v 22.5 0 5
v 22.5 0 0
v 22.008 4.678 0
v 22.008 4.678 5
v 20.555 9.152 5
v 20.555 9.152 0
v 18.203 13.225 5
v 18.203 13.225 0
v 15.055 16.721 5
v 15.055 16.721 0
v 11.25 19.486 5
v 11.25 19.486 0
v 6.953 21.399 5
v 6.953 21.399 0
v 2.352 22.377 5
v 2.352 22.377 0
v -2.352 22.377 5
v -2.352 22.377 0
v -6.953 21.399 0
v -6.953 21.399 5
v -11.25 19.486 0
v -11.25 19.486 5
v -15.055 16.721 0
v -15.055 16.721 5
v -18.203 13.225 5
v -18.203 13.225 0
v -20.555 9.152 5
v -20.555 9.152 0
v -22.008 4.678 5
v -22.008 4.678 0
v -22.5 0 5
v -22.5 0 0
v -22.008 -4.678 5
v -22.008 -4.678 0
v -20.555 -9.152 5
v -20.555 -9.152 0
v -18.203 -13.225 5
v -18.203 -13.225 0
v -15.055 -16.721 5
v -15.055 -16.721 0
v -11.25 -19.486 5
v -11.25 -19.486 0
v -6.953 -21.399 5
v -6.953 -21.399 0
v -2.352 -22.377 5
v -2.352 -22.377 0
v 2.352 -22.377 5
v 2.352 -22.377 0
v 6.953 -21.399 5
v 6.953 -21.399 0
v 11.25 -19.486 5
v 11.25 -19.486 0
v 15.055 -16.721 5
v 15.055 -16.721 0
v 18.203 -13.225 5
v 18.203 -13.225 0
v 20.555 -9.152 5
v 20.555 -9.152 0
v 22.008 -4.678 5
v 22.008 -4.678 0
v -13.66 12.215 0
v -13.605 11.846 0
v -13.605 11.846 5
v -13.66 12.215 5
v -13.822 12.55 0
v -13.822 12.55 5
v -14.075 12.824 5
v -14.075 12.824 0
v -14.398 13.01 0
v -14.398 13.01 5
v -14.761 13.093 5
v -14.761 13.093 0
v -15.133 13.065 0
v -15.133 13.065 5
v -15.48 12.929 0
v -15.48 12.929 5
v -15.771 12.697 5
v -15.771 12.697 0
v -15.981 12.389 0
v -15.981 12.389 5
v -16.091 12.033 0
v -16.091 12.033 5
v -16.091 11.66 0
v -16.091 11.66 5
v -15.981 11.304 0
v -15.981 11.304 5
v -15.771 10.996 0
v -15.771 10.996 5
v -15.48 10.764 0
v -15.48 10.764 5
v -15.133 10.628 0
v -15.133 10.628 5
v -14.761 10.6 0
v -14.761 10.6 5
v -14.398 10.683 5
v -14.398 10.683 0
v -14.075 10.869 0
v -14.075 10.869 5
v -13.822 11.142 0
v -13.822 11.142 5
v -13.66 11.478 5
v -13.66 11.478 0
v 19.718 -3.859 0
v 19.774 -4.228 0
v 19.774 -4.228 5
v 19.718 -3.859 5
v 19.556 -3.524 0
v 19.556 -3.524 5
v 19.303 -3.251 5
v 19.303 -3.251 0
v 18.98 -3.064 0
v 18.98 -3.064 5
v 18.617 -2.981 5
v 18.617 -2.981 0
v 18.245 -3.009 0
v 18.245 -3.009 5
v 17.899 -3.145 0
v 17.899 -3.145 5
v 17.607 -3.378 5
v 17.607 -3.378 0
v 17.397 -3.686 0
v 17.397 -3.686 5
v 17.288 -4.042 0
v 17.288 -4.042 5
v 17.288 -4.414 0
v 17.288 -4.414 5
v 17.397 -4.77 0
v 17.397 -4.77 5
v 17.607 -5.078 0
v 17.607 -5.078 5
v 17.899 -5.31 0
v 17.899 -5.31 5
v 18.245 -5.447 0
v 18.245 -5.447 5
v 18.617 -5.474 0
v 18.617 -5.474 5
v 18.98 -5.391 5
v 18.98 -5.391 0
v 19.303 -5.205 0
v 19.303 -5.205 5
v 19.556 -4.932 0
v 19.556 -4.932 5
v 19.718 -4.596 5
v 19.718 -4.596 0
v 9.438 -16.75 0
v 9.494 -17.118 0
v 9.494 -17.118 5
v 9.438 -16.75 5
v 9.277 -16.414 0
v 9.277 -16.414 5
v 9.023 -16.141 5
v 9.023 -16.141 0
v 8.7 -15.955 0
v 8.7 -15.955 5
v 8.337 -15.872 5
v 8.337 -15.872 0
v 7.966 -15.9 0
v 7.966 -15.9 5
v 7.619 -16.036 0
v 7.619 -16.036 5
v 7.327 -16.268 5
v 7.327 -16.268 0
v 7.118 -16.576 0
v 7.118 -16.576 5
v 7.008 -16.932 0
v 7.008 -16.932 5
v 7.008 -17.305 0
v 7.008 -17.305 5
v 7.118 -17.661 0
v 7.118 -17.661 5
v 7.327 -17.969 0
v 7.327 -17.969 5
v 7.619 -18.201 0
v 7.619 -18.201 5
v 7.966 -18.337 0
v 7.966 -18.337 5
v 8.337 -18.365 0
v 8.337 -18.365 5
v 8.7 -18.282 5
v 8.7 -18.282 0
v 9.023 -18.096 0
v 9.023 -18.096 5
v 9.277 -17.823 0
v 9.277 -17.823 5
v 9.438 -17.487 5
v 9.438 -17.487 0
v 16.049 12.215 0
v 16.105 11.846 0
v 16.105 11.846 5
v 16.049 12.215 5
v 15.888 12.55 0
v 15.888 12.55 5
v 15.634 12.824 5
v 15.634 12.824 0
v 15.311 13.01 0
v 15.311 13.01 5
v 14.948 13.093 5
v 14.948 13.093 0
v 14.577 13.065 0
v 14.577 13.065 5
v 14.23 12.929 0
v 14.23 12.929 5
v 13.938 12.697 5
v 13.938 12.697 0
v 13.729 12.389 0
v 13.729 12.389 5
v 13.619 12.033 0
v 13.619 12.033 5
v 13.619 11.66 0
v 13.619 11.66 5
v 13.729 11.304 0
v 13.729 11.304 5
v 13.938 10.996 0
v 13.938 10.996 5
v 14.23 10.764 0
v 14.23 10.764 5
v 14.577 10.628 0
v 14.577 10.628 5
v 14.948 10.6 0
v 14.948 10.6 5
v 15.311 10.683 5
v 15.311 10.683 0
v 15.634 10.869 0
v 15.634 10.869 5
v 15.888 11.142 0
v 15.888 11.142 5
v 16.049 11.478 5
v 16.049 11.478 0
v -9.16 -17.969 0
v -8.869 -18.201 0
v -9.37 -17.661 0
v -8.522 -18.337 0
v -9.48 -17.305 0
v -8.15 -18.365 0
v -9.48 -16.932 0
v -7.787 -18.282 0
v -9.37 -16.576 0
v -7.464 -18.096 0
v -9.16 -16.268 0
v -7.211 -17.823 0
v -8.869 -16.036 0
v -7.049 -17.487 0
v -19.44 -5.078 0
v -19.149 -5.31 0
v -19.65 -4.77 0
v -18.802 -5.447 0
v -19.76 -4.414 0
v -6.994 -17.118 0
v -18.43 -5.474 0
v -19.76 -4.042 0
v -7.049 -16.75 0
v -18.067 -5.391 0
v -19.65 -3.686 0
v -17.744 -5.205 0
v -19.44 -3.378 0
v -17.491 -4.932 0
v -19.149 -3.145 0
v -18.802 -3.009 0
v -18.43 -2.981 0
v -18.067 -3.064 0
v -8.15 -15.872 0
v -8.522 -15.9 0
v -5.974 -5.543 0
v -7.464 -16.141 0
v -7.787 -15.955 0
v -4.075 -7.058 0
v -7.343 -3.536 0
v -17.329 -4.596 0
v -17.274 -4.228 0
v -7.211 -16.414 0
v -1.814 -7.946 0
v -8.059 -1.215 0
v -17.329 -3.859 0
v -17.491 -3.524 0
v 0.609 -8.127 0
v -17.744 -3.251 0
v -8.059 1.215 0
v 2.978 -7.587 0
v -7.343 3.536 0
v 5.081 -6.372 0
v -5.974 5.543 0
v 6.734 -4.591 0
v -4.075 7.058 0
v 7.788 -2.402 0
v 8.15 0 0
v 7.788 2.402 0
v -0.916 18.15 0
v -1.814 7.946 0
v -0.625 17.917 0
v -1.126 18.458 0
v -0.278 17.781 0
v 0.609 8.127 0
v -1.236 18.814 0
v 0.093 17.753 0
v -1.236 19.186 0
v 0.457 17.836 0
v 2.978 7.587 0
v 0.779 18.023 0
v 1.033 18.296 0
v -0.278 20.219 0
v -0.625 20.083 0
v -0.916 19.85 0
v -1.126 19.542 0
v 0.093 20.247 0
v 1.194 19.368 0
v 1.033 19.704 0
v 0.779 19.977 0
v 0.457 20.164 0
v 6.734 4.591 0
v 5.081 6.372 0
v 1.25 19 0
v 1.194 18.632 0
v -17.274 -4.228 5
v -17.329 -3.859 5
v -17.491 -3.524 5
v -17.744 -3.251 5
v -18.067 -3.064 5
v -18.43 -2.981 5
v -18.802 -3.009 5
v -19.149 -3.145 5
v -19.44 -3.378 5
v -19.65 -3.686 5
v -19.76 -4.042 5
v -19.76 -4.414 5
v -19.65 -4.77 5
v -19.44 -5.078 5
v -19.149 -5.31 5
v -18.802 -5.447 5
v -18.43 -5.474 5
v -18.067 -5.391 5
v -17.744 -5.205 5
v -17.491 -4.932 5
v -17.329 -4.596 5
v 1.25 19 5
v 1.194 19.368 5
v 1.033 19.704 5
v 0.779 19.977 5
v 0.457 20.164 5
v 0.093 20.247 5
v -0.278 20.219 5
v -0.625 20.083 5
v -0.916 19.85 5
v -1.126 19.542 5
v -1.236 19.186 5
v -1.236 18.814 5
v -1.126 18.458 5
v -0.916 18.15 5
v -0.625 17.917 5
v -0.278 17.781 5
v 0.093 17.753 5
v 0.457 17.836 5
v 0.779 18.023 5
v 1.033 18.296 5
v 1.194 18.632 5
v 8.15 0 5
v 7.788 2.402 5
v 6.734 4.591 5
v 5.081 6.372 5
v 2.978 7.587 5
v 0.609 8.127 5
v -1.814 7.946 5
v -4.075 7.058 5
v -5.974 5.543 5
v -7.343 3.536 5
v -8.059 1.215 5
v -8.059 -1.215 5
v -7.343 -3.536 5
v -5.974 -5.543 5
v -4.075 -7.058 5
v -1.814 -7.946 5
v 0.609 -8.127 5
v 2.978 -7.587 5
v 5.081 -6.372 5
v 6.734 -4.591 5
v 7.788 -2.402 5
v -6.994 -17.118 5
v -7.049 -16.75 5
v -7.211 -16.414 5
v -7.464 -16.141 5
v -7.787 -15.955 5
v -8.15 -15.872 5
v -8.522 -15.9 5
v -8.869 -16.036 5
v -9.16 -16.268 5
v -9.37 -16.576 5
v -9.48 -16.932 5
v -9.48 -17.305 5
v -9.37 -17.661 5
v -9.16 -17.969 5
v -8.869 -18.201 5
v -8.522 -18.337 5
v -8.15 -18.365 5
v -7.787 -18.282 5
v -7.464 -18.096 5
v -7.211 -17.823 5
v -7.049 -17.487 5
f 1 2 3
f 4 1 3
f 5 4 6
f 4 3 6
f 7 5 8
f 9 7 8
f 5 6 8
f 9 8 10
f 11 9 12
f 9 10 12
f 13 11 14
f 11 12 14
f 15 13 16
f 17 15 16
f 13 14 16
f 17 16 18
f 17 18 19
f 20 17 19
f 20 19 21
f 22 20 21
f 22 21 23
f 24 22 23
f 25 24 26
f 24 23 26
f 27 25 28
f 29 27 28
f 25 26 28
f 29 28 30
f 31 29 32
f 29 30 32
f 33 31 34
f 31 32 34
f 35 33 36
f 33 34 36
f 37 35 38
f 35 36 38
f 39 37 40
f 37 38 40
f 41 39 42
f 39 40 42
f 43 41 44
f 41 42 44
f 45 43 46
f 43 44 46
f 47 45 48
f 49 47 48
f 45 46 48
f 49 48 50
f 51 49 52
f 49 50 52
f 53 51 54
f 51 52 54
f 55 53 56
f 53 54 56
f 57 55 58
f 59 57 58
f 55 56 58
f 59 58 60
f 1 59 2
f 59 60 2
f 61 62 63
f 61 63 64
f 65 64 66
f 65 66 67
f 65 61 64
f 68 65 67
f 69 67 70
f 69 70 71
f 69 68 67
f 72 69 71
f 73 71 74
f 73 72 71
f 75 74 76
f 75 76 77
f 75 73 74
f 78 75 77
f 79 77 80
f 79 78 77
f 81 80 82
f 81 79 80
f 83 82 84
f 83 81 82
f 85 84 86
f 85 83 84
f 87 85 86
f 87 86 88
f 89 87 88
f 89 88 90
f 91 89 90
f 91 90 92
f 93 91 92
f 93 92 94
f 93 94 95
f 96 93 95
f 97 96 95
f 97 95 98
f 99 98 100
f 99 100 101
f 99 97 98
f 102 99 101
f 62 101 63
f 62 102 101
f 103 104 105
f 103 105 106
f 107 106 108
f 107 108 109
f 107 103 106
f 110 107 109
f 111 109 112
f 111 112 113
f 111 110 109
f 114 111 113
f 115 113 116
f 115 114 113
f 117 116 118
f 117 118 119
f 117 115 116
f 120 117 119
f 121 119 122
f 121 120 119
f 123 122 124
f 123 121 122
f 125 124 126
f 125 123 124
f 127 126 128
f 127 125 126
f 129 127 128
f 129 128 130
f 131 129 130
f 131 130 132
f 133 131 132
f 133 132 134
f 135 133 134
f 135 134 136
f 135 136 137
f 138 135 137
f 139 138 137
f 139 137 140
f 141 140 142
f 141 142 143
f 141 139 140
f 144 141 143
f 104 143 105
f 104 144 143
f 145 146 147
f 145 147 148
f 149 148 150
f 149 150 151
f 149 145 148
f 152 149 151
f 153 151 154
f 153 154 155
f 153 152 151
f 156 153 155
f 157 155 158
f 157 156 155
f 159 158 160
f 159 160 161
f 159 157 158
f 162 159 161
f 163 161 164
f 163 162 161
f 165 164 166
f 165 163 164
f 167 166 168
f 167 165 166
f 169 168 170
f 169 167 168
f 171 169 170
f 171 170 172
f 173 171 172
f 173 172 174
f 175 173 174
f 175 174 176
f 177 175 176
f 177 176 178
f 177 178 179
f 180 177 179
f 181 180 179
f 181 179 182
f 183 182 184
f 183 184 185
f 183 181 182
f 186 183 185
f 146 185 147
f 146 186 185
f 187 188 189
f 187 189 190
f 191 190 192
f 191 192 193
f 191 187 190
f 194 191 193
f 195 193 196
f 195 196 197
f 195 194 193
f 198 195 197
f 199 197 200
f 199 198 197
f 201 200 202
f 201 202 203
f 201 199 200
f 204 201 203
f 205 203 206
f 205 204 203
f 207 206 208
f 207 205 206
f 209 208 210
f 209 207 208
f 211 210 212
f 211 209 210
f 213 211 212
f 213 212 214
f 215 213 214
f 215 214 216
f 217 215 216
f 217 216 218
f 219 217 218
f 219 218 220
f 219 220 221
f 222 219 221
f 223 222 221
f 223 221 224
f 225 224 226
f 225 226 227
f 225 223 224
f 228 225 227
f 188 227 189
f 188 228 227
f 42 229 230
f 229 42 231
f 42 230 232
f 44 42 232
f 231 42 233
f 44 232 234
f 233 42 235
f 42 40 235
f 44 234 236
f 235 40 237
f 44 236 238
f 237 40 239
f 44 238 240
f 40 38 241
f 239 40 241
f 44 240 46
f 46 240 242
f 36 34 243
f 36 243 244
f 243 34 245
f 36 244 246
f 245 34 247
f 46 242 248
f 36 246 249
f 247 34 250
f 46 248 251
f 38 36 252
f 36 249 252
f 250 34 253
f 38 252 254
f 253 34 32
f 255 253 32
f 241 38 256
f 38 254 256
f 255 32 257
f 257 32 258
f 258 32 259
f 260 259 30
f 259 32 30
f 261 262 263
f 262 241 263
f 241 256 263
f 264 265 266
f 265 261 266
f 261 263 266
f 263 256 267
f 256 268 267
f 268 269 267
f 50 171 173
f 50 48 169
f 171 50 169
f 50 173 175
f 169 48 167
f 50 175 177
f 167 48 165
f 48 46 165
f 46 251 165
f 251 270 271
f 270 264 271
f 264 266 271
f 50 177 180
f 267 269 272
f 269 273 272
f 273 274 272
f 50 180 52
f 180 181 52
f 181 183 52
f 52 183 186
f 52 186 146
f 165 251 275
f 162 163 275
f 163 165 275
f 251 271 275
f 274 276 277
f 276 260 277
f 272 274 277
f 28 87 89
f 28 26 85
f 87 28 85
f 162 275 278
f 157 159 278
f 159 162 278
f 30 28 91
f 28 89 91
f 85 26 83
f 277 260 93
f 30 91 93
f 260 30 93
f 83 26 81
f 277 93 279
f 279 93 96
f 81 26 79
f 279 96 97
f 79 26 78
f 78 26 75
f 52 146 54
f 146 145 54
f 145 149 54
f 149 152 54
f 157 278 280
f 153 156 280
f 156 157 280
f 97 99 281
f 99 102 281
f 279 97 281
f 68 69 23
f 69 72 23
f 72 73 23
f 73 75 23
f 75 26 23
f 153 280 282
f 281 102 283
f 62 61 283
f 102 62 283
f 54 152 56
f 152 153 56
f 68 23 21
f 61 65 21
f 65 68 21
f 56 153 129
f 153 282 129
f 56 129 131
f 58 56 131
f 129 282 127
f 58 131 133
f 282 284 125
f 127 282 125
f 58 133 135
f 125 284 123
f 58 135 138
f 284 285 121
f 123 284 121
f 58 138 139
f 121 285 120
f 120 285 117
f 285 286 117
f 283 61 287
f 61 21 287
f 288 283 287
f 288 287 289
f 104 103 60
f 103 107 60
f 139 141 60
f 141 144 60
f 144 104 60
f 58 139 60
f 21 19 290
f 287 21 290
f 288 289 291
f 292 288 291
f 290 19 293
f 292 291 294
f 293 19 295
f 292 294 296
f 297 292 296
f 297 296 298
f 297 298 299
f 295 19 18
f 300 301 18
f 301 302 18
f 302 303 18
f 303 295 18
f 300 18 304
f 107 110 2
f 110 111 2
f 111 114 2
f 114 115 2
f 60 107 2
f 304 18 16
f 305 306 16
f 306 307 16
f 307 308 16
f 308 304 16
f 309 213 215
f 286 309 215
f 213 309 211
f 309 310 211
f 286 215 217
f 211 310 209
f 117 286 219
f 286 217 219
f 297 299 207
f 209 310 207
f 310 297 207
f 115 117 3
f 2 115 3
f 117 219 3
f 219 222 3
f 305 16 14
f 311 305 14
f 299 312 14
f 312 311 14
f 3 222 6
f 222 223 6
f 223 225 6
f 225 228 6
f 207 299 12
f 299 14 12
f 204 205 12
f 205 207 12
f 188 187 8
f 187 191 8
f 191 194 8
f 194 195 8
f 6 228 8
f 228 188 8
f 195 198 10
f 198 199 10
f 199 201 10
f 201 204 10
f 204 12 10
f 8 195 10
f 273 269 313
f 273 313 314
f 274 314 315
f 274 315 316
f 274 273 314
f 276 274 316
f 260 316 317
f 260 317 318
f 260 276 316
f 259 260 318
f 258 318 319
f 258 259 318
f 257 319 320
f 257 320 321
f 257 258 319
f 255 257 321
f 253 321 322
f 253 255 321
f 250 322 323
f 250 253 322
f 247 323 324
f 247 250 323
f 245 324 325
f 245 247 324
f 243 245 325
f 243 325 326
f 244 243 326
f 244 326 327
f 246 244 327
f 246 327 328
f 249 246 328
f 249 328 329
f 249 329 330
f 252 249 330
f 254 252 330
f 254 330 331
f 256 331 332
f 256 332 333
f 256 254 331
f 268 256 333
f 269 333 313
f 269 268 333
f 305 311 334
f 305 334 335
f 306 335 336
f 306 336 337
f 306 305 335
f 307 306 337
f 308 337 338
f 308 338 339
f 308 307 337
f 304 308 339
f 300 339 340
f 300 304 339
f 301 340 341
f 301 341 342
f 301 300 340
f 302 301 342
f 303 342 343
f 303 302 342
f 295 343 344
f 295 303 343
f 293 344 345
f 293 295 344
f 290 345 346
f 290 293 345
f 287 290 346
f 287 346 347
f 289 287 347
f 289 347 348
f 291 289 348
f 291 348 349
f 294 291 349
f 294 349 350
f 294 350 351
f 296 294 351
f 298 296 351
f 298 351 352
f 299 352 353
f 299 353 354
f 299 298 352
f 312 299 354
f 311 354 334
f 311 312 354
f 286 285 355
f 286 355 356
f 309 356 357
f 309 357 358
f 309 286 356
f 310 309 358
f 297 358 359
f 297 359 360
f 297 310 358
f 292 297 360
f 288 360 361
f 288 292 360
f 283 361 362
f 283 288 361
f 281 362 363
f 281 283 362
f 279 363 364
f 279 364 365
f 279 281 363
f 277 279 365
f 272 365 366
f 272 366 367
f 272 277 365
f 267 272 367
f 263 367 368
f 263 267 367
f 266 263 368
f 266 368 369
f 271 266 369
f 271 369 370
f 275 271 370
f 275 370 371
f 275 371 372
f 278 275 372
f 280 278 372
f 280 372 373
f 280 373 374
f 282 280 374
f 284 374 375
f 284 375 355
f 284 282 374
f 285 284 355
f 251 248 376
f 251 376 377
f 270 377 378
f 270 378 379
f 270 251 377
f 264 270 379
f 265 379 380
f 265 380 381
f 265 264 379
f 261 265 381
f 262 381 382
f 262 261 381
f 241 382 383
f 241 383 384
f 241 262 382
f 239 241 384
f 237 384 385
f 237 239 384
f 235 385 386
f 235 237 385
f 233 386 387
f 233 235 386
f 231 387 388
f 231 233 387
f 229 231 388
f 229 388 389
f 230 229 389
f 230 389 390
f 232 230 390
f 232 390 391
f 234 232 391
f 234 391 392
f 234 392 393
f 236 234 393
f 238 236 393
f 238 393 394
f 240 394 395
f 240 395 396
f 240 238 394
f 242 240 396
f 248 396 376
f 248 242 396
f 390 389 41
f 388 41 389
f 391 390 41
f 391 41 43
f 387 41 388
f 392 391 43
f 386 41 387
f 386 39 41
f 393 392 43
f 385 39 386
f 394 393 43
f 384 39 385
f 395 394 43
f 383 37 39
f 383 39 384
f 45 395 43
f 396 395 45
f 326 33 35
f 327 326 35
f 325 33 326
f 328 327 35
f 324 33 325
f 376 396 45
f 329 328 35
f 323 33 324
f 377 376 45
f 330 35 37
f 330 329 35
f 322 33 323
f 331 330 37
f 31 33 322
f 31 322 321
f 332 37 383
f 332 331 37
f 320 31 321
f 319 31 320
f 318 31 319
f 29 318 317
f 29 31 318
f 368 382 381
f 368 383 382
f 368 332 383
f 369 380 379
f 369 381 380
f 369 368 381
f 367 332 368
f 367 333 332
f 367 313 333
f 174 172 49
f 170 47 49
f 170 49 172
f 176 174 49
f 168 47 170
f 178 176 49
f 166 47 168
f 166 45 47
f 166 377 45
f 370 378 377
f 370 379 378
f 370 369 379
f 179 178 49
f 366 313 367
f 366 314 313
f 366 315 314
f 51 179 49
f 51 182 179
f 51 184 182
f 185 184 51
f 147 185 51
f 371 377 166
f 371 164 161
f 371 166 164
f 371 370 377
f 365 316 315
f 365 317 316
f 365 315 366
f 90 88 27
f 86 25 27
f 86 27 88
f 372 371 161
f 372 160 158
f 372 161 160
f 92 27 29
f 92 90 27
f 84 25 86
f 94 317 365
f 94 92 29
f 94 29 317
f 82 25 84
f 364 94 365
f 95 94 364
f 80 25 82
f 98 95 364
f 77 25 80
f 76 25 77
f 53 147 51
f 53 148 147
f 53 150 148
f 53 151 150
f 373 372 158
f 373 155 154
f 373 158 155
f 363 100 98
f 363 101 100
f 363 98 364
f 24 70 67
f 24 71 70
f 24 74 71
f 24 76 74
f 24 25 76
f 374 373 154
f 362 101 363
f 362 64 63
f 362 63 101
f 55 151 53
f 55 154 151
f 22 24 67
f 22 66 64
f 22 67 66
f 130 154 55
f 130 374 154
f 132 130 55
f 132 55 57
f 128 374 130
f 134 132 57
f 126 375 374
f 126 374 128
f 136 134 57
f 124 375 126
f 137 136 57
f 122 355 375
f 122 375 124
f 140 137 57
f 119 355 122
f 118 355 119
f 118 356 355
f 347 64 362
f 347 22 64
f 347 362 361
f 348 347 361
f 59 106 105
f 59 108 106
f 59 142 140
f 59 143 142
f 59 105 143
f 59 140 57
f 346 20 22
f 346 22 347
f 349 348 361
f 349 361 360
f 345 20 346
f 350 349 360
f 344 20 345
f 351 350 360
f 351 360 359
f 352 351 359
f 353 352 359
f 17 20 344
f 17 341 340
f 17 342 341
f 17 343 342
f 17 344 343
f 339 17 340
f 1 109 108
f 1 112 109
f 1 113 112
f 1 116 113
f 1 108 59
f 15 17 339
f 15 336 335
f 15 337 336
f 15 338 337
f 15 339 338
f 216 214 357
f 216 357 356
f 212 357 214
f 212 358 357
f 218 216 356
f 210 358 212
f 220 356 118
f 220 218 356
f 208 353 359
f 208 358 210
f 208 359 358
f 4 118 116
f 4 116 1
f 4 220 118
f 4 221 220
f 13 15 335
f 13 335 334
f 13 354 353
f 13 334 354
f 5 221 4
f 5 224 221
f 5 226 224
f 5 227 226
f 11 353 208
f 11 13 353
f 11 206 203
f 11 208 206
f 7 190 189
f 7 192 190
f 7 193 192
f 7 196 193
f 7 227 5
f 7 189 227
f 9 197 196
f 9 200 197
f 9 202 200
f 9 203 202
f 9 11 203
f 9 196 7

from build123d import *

# Parameters (mm, degrees)
SKETCH1_R           = 22.5
SKETCH1_R_2         = 1.25
SKETCH1_R_3         = 8.15
BOSS_EXTRUDE1_DEPTH = 5


with BuildPart() as part:
    # Sketch1 → Boss-Extrude1 (new body)
    with BuildSketch(Plane.XY):
        Circle(SKETCH1_R)
        with Locations((0, 19)):
            Circle(SKETCH1_R_2, mode=Mode.SUBTRACT)
        with Locations((14.854798167, 11.846306235)):
            Circle(SKETCH1_R_2, mode=Mode.SUBTRACT)
        with Locations((18.523630331, -4.227897745)):
            Circle(SKETCH1_R_2, mode=Mode.SUBTRACT)
        with Locations((8.243791043, -17.11840849)):
            Circle(SKETCH1_R_2, mode=Mode.SUBTRACT)
        with Locations((-8.243791043, -17.11840849)):
            Circle(SKETCH1_R_2, mode=Mode.SUBTRACT)
        with Locations((-18.523630331, -4.227897745)):
            Circle(SKETCH1_R_2, mode=Mode.SUBTRACT)
        Circle(SKETCH1_R_3, mode=Mode.SUBTRACT)
        with Locations((-14.854798167, 11.846306235)):
            Circle(SKETCH1_R_2, mode=Mode.SUBTRACT)
    extrude(amount=BOSS_EXTRUDE1_DEPTH)


solid = part.part
